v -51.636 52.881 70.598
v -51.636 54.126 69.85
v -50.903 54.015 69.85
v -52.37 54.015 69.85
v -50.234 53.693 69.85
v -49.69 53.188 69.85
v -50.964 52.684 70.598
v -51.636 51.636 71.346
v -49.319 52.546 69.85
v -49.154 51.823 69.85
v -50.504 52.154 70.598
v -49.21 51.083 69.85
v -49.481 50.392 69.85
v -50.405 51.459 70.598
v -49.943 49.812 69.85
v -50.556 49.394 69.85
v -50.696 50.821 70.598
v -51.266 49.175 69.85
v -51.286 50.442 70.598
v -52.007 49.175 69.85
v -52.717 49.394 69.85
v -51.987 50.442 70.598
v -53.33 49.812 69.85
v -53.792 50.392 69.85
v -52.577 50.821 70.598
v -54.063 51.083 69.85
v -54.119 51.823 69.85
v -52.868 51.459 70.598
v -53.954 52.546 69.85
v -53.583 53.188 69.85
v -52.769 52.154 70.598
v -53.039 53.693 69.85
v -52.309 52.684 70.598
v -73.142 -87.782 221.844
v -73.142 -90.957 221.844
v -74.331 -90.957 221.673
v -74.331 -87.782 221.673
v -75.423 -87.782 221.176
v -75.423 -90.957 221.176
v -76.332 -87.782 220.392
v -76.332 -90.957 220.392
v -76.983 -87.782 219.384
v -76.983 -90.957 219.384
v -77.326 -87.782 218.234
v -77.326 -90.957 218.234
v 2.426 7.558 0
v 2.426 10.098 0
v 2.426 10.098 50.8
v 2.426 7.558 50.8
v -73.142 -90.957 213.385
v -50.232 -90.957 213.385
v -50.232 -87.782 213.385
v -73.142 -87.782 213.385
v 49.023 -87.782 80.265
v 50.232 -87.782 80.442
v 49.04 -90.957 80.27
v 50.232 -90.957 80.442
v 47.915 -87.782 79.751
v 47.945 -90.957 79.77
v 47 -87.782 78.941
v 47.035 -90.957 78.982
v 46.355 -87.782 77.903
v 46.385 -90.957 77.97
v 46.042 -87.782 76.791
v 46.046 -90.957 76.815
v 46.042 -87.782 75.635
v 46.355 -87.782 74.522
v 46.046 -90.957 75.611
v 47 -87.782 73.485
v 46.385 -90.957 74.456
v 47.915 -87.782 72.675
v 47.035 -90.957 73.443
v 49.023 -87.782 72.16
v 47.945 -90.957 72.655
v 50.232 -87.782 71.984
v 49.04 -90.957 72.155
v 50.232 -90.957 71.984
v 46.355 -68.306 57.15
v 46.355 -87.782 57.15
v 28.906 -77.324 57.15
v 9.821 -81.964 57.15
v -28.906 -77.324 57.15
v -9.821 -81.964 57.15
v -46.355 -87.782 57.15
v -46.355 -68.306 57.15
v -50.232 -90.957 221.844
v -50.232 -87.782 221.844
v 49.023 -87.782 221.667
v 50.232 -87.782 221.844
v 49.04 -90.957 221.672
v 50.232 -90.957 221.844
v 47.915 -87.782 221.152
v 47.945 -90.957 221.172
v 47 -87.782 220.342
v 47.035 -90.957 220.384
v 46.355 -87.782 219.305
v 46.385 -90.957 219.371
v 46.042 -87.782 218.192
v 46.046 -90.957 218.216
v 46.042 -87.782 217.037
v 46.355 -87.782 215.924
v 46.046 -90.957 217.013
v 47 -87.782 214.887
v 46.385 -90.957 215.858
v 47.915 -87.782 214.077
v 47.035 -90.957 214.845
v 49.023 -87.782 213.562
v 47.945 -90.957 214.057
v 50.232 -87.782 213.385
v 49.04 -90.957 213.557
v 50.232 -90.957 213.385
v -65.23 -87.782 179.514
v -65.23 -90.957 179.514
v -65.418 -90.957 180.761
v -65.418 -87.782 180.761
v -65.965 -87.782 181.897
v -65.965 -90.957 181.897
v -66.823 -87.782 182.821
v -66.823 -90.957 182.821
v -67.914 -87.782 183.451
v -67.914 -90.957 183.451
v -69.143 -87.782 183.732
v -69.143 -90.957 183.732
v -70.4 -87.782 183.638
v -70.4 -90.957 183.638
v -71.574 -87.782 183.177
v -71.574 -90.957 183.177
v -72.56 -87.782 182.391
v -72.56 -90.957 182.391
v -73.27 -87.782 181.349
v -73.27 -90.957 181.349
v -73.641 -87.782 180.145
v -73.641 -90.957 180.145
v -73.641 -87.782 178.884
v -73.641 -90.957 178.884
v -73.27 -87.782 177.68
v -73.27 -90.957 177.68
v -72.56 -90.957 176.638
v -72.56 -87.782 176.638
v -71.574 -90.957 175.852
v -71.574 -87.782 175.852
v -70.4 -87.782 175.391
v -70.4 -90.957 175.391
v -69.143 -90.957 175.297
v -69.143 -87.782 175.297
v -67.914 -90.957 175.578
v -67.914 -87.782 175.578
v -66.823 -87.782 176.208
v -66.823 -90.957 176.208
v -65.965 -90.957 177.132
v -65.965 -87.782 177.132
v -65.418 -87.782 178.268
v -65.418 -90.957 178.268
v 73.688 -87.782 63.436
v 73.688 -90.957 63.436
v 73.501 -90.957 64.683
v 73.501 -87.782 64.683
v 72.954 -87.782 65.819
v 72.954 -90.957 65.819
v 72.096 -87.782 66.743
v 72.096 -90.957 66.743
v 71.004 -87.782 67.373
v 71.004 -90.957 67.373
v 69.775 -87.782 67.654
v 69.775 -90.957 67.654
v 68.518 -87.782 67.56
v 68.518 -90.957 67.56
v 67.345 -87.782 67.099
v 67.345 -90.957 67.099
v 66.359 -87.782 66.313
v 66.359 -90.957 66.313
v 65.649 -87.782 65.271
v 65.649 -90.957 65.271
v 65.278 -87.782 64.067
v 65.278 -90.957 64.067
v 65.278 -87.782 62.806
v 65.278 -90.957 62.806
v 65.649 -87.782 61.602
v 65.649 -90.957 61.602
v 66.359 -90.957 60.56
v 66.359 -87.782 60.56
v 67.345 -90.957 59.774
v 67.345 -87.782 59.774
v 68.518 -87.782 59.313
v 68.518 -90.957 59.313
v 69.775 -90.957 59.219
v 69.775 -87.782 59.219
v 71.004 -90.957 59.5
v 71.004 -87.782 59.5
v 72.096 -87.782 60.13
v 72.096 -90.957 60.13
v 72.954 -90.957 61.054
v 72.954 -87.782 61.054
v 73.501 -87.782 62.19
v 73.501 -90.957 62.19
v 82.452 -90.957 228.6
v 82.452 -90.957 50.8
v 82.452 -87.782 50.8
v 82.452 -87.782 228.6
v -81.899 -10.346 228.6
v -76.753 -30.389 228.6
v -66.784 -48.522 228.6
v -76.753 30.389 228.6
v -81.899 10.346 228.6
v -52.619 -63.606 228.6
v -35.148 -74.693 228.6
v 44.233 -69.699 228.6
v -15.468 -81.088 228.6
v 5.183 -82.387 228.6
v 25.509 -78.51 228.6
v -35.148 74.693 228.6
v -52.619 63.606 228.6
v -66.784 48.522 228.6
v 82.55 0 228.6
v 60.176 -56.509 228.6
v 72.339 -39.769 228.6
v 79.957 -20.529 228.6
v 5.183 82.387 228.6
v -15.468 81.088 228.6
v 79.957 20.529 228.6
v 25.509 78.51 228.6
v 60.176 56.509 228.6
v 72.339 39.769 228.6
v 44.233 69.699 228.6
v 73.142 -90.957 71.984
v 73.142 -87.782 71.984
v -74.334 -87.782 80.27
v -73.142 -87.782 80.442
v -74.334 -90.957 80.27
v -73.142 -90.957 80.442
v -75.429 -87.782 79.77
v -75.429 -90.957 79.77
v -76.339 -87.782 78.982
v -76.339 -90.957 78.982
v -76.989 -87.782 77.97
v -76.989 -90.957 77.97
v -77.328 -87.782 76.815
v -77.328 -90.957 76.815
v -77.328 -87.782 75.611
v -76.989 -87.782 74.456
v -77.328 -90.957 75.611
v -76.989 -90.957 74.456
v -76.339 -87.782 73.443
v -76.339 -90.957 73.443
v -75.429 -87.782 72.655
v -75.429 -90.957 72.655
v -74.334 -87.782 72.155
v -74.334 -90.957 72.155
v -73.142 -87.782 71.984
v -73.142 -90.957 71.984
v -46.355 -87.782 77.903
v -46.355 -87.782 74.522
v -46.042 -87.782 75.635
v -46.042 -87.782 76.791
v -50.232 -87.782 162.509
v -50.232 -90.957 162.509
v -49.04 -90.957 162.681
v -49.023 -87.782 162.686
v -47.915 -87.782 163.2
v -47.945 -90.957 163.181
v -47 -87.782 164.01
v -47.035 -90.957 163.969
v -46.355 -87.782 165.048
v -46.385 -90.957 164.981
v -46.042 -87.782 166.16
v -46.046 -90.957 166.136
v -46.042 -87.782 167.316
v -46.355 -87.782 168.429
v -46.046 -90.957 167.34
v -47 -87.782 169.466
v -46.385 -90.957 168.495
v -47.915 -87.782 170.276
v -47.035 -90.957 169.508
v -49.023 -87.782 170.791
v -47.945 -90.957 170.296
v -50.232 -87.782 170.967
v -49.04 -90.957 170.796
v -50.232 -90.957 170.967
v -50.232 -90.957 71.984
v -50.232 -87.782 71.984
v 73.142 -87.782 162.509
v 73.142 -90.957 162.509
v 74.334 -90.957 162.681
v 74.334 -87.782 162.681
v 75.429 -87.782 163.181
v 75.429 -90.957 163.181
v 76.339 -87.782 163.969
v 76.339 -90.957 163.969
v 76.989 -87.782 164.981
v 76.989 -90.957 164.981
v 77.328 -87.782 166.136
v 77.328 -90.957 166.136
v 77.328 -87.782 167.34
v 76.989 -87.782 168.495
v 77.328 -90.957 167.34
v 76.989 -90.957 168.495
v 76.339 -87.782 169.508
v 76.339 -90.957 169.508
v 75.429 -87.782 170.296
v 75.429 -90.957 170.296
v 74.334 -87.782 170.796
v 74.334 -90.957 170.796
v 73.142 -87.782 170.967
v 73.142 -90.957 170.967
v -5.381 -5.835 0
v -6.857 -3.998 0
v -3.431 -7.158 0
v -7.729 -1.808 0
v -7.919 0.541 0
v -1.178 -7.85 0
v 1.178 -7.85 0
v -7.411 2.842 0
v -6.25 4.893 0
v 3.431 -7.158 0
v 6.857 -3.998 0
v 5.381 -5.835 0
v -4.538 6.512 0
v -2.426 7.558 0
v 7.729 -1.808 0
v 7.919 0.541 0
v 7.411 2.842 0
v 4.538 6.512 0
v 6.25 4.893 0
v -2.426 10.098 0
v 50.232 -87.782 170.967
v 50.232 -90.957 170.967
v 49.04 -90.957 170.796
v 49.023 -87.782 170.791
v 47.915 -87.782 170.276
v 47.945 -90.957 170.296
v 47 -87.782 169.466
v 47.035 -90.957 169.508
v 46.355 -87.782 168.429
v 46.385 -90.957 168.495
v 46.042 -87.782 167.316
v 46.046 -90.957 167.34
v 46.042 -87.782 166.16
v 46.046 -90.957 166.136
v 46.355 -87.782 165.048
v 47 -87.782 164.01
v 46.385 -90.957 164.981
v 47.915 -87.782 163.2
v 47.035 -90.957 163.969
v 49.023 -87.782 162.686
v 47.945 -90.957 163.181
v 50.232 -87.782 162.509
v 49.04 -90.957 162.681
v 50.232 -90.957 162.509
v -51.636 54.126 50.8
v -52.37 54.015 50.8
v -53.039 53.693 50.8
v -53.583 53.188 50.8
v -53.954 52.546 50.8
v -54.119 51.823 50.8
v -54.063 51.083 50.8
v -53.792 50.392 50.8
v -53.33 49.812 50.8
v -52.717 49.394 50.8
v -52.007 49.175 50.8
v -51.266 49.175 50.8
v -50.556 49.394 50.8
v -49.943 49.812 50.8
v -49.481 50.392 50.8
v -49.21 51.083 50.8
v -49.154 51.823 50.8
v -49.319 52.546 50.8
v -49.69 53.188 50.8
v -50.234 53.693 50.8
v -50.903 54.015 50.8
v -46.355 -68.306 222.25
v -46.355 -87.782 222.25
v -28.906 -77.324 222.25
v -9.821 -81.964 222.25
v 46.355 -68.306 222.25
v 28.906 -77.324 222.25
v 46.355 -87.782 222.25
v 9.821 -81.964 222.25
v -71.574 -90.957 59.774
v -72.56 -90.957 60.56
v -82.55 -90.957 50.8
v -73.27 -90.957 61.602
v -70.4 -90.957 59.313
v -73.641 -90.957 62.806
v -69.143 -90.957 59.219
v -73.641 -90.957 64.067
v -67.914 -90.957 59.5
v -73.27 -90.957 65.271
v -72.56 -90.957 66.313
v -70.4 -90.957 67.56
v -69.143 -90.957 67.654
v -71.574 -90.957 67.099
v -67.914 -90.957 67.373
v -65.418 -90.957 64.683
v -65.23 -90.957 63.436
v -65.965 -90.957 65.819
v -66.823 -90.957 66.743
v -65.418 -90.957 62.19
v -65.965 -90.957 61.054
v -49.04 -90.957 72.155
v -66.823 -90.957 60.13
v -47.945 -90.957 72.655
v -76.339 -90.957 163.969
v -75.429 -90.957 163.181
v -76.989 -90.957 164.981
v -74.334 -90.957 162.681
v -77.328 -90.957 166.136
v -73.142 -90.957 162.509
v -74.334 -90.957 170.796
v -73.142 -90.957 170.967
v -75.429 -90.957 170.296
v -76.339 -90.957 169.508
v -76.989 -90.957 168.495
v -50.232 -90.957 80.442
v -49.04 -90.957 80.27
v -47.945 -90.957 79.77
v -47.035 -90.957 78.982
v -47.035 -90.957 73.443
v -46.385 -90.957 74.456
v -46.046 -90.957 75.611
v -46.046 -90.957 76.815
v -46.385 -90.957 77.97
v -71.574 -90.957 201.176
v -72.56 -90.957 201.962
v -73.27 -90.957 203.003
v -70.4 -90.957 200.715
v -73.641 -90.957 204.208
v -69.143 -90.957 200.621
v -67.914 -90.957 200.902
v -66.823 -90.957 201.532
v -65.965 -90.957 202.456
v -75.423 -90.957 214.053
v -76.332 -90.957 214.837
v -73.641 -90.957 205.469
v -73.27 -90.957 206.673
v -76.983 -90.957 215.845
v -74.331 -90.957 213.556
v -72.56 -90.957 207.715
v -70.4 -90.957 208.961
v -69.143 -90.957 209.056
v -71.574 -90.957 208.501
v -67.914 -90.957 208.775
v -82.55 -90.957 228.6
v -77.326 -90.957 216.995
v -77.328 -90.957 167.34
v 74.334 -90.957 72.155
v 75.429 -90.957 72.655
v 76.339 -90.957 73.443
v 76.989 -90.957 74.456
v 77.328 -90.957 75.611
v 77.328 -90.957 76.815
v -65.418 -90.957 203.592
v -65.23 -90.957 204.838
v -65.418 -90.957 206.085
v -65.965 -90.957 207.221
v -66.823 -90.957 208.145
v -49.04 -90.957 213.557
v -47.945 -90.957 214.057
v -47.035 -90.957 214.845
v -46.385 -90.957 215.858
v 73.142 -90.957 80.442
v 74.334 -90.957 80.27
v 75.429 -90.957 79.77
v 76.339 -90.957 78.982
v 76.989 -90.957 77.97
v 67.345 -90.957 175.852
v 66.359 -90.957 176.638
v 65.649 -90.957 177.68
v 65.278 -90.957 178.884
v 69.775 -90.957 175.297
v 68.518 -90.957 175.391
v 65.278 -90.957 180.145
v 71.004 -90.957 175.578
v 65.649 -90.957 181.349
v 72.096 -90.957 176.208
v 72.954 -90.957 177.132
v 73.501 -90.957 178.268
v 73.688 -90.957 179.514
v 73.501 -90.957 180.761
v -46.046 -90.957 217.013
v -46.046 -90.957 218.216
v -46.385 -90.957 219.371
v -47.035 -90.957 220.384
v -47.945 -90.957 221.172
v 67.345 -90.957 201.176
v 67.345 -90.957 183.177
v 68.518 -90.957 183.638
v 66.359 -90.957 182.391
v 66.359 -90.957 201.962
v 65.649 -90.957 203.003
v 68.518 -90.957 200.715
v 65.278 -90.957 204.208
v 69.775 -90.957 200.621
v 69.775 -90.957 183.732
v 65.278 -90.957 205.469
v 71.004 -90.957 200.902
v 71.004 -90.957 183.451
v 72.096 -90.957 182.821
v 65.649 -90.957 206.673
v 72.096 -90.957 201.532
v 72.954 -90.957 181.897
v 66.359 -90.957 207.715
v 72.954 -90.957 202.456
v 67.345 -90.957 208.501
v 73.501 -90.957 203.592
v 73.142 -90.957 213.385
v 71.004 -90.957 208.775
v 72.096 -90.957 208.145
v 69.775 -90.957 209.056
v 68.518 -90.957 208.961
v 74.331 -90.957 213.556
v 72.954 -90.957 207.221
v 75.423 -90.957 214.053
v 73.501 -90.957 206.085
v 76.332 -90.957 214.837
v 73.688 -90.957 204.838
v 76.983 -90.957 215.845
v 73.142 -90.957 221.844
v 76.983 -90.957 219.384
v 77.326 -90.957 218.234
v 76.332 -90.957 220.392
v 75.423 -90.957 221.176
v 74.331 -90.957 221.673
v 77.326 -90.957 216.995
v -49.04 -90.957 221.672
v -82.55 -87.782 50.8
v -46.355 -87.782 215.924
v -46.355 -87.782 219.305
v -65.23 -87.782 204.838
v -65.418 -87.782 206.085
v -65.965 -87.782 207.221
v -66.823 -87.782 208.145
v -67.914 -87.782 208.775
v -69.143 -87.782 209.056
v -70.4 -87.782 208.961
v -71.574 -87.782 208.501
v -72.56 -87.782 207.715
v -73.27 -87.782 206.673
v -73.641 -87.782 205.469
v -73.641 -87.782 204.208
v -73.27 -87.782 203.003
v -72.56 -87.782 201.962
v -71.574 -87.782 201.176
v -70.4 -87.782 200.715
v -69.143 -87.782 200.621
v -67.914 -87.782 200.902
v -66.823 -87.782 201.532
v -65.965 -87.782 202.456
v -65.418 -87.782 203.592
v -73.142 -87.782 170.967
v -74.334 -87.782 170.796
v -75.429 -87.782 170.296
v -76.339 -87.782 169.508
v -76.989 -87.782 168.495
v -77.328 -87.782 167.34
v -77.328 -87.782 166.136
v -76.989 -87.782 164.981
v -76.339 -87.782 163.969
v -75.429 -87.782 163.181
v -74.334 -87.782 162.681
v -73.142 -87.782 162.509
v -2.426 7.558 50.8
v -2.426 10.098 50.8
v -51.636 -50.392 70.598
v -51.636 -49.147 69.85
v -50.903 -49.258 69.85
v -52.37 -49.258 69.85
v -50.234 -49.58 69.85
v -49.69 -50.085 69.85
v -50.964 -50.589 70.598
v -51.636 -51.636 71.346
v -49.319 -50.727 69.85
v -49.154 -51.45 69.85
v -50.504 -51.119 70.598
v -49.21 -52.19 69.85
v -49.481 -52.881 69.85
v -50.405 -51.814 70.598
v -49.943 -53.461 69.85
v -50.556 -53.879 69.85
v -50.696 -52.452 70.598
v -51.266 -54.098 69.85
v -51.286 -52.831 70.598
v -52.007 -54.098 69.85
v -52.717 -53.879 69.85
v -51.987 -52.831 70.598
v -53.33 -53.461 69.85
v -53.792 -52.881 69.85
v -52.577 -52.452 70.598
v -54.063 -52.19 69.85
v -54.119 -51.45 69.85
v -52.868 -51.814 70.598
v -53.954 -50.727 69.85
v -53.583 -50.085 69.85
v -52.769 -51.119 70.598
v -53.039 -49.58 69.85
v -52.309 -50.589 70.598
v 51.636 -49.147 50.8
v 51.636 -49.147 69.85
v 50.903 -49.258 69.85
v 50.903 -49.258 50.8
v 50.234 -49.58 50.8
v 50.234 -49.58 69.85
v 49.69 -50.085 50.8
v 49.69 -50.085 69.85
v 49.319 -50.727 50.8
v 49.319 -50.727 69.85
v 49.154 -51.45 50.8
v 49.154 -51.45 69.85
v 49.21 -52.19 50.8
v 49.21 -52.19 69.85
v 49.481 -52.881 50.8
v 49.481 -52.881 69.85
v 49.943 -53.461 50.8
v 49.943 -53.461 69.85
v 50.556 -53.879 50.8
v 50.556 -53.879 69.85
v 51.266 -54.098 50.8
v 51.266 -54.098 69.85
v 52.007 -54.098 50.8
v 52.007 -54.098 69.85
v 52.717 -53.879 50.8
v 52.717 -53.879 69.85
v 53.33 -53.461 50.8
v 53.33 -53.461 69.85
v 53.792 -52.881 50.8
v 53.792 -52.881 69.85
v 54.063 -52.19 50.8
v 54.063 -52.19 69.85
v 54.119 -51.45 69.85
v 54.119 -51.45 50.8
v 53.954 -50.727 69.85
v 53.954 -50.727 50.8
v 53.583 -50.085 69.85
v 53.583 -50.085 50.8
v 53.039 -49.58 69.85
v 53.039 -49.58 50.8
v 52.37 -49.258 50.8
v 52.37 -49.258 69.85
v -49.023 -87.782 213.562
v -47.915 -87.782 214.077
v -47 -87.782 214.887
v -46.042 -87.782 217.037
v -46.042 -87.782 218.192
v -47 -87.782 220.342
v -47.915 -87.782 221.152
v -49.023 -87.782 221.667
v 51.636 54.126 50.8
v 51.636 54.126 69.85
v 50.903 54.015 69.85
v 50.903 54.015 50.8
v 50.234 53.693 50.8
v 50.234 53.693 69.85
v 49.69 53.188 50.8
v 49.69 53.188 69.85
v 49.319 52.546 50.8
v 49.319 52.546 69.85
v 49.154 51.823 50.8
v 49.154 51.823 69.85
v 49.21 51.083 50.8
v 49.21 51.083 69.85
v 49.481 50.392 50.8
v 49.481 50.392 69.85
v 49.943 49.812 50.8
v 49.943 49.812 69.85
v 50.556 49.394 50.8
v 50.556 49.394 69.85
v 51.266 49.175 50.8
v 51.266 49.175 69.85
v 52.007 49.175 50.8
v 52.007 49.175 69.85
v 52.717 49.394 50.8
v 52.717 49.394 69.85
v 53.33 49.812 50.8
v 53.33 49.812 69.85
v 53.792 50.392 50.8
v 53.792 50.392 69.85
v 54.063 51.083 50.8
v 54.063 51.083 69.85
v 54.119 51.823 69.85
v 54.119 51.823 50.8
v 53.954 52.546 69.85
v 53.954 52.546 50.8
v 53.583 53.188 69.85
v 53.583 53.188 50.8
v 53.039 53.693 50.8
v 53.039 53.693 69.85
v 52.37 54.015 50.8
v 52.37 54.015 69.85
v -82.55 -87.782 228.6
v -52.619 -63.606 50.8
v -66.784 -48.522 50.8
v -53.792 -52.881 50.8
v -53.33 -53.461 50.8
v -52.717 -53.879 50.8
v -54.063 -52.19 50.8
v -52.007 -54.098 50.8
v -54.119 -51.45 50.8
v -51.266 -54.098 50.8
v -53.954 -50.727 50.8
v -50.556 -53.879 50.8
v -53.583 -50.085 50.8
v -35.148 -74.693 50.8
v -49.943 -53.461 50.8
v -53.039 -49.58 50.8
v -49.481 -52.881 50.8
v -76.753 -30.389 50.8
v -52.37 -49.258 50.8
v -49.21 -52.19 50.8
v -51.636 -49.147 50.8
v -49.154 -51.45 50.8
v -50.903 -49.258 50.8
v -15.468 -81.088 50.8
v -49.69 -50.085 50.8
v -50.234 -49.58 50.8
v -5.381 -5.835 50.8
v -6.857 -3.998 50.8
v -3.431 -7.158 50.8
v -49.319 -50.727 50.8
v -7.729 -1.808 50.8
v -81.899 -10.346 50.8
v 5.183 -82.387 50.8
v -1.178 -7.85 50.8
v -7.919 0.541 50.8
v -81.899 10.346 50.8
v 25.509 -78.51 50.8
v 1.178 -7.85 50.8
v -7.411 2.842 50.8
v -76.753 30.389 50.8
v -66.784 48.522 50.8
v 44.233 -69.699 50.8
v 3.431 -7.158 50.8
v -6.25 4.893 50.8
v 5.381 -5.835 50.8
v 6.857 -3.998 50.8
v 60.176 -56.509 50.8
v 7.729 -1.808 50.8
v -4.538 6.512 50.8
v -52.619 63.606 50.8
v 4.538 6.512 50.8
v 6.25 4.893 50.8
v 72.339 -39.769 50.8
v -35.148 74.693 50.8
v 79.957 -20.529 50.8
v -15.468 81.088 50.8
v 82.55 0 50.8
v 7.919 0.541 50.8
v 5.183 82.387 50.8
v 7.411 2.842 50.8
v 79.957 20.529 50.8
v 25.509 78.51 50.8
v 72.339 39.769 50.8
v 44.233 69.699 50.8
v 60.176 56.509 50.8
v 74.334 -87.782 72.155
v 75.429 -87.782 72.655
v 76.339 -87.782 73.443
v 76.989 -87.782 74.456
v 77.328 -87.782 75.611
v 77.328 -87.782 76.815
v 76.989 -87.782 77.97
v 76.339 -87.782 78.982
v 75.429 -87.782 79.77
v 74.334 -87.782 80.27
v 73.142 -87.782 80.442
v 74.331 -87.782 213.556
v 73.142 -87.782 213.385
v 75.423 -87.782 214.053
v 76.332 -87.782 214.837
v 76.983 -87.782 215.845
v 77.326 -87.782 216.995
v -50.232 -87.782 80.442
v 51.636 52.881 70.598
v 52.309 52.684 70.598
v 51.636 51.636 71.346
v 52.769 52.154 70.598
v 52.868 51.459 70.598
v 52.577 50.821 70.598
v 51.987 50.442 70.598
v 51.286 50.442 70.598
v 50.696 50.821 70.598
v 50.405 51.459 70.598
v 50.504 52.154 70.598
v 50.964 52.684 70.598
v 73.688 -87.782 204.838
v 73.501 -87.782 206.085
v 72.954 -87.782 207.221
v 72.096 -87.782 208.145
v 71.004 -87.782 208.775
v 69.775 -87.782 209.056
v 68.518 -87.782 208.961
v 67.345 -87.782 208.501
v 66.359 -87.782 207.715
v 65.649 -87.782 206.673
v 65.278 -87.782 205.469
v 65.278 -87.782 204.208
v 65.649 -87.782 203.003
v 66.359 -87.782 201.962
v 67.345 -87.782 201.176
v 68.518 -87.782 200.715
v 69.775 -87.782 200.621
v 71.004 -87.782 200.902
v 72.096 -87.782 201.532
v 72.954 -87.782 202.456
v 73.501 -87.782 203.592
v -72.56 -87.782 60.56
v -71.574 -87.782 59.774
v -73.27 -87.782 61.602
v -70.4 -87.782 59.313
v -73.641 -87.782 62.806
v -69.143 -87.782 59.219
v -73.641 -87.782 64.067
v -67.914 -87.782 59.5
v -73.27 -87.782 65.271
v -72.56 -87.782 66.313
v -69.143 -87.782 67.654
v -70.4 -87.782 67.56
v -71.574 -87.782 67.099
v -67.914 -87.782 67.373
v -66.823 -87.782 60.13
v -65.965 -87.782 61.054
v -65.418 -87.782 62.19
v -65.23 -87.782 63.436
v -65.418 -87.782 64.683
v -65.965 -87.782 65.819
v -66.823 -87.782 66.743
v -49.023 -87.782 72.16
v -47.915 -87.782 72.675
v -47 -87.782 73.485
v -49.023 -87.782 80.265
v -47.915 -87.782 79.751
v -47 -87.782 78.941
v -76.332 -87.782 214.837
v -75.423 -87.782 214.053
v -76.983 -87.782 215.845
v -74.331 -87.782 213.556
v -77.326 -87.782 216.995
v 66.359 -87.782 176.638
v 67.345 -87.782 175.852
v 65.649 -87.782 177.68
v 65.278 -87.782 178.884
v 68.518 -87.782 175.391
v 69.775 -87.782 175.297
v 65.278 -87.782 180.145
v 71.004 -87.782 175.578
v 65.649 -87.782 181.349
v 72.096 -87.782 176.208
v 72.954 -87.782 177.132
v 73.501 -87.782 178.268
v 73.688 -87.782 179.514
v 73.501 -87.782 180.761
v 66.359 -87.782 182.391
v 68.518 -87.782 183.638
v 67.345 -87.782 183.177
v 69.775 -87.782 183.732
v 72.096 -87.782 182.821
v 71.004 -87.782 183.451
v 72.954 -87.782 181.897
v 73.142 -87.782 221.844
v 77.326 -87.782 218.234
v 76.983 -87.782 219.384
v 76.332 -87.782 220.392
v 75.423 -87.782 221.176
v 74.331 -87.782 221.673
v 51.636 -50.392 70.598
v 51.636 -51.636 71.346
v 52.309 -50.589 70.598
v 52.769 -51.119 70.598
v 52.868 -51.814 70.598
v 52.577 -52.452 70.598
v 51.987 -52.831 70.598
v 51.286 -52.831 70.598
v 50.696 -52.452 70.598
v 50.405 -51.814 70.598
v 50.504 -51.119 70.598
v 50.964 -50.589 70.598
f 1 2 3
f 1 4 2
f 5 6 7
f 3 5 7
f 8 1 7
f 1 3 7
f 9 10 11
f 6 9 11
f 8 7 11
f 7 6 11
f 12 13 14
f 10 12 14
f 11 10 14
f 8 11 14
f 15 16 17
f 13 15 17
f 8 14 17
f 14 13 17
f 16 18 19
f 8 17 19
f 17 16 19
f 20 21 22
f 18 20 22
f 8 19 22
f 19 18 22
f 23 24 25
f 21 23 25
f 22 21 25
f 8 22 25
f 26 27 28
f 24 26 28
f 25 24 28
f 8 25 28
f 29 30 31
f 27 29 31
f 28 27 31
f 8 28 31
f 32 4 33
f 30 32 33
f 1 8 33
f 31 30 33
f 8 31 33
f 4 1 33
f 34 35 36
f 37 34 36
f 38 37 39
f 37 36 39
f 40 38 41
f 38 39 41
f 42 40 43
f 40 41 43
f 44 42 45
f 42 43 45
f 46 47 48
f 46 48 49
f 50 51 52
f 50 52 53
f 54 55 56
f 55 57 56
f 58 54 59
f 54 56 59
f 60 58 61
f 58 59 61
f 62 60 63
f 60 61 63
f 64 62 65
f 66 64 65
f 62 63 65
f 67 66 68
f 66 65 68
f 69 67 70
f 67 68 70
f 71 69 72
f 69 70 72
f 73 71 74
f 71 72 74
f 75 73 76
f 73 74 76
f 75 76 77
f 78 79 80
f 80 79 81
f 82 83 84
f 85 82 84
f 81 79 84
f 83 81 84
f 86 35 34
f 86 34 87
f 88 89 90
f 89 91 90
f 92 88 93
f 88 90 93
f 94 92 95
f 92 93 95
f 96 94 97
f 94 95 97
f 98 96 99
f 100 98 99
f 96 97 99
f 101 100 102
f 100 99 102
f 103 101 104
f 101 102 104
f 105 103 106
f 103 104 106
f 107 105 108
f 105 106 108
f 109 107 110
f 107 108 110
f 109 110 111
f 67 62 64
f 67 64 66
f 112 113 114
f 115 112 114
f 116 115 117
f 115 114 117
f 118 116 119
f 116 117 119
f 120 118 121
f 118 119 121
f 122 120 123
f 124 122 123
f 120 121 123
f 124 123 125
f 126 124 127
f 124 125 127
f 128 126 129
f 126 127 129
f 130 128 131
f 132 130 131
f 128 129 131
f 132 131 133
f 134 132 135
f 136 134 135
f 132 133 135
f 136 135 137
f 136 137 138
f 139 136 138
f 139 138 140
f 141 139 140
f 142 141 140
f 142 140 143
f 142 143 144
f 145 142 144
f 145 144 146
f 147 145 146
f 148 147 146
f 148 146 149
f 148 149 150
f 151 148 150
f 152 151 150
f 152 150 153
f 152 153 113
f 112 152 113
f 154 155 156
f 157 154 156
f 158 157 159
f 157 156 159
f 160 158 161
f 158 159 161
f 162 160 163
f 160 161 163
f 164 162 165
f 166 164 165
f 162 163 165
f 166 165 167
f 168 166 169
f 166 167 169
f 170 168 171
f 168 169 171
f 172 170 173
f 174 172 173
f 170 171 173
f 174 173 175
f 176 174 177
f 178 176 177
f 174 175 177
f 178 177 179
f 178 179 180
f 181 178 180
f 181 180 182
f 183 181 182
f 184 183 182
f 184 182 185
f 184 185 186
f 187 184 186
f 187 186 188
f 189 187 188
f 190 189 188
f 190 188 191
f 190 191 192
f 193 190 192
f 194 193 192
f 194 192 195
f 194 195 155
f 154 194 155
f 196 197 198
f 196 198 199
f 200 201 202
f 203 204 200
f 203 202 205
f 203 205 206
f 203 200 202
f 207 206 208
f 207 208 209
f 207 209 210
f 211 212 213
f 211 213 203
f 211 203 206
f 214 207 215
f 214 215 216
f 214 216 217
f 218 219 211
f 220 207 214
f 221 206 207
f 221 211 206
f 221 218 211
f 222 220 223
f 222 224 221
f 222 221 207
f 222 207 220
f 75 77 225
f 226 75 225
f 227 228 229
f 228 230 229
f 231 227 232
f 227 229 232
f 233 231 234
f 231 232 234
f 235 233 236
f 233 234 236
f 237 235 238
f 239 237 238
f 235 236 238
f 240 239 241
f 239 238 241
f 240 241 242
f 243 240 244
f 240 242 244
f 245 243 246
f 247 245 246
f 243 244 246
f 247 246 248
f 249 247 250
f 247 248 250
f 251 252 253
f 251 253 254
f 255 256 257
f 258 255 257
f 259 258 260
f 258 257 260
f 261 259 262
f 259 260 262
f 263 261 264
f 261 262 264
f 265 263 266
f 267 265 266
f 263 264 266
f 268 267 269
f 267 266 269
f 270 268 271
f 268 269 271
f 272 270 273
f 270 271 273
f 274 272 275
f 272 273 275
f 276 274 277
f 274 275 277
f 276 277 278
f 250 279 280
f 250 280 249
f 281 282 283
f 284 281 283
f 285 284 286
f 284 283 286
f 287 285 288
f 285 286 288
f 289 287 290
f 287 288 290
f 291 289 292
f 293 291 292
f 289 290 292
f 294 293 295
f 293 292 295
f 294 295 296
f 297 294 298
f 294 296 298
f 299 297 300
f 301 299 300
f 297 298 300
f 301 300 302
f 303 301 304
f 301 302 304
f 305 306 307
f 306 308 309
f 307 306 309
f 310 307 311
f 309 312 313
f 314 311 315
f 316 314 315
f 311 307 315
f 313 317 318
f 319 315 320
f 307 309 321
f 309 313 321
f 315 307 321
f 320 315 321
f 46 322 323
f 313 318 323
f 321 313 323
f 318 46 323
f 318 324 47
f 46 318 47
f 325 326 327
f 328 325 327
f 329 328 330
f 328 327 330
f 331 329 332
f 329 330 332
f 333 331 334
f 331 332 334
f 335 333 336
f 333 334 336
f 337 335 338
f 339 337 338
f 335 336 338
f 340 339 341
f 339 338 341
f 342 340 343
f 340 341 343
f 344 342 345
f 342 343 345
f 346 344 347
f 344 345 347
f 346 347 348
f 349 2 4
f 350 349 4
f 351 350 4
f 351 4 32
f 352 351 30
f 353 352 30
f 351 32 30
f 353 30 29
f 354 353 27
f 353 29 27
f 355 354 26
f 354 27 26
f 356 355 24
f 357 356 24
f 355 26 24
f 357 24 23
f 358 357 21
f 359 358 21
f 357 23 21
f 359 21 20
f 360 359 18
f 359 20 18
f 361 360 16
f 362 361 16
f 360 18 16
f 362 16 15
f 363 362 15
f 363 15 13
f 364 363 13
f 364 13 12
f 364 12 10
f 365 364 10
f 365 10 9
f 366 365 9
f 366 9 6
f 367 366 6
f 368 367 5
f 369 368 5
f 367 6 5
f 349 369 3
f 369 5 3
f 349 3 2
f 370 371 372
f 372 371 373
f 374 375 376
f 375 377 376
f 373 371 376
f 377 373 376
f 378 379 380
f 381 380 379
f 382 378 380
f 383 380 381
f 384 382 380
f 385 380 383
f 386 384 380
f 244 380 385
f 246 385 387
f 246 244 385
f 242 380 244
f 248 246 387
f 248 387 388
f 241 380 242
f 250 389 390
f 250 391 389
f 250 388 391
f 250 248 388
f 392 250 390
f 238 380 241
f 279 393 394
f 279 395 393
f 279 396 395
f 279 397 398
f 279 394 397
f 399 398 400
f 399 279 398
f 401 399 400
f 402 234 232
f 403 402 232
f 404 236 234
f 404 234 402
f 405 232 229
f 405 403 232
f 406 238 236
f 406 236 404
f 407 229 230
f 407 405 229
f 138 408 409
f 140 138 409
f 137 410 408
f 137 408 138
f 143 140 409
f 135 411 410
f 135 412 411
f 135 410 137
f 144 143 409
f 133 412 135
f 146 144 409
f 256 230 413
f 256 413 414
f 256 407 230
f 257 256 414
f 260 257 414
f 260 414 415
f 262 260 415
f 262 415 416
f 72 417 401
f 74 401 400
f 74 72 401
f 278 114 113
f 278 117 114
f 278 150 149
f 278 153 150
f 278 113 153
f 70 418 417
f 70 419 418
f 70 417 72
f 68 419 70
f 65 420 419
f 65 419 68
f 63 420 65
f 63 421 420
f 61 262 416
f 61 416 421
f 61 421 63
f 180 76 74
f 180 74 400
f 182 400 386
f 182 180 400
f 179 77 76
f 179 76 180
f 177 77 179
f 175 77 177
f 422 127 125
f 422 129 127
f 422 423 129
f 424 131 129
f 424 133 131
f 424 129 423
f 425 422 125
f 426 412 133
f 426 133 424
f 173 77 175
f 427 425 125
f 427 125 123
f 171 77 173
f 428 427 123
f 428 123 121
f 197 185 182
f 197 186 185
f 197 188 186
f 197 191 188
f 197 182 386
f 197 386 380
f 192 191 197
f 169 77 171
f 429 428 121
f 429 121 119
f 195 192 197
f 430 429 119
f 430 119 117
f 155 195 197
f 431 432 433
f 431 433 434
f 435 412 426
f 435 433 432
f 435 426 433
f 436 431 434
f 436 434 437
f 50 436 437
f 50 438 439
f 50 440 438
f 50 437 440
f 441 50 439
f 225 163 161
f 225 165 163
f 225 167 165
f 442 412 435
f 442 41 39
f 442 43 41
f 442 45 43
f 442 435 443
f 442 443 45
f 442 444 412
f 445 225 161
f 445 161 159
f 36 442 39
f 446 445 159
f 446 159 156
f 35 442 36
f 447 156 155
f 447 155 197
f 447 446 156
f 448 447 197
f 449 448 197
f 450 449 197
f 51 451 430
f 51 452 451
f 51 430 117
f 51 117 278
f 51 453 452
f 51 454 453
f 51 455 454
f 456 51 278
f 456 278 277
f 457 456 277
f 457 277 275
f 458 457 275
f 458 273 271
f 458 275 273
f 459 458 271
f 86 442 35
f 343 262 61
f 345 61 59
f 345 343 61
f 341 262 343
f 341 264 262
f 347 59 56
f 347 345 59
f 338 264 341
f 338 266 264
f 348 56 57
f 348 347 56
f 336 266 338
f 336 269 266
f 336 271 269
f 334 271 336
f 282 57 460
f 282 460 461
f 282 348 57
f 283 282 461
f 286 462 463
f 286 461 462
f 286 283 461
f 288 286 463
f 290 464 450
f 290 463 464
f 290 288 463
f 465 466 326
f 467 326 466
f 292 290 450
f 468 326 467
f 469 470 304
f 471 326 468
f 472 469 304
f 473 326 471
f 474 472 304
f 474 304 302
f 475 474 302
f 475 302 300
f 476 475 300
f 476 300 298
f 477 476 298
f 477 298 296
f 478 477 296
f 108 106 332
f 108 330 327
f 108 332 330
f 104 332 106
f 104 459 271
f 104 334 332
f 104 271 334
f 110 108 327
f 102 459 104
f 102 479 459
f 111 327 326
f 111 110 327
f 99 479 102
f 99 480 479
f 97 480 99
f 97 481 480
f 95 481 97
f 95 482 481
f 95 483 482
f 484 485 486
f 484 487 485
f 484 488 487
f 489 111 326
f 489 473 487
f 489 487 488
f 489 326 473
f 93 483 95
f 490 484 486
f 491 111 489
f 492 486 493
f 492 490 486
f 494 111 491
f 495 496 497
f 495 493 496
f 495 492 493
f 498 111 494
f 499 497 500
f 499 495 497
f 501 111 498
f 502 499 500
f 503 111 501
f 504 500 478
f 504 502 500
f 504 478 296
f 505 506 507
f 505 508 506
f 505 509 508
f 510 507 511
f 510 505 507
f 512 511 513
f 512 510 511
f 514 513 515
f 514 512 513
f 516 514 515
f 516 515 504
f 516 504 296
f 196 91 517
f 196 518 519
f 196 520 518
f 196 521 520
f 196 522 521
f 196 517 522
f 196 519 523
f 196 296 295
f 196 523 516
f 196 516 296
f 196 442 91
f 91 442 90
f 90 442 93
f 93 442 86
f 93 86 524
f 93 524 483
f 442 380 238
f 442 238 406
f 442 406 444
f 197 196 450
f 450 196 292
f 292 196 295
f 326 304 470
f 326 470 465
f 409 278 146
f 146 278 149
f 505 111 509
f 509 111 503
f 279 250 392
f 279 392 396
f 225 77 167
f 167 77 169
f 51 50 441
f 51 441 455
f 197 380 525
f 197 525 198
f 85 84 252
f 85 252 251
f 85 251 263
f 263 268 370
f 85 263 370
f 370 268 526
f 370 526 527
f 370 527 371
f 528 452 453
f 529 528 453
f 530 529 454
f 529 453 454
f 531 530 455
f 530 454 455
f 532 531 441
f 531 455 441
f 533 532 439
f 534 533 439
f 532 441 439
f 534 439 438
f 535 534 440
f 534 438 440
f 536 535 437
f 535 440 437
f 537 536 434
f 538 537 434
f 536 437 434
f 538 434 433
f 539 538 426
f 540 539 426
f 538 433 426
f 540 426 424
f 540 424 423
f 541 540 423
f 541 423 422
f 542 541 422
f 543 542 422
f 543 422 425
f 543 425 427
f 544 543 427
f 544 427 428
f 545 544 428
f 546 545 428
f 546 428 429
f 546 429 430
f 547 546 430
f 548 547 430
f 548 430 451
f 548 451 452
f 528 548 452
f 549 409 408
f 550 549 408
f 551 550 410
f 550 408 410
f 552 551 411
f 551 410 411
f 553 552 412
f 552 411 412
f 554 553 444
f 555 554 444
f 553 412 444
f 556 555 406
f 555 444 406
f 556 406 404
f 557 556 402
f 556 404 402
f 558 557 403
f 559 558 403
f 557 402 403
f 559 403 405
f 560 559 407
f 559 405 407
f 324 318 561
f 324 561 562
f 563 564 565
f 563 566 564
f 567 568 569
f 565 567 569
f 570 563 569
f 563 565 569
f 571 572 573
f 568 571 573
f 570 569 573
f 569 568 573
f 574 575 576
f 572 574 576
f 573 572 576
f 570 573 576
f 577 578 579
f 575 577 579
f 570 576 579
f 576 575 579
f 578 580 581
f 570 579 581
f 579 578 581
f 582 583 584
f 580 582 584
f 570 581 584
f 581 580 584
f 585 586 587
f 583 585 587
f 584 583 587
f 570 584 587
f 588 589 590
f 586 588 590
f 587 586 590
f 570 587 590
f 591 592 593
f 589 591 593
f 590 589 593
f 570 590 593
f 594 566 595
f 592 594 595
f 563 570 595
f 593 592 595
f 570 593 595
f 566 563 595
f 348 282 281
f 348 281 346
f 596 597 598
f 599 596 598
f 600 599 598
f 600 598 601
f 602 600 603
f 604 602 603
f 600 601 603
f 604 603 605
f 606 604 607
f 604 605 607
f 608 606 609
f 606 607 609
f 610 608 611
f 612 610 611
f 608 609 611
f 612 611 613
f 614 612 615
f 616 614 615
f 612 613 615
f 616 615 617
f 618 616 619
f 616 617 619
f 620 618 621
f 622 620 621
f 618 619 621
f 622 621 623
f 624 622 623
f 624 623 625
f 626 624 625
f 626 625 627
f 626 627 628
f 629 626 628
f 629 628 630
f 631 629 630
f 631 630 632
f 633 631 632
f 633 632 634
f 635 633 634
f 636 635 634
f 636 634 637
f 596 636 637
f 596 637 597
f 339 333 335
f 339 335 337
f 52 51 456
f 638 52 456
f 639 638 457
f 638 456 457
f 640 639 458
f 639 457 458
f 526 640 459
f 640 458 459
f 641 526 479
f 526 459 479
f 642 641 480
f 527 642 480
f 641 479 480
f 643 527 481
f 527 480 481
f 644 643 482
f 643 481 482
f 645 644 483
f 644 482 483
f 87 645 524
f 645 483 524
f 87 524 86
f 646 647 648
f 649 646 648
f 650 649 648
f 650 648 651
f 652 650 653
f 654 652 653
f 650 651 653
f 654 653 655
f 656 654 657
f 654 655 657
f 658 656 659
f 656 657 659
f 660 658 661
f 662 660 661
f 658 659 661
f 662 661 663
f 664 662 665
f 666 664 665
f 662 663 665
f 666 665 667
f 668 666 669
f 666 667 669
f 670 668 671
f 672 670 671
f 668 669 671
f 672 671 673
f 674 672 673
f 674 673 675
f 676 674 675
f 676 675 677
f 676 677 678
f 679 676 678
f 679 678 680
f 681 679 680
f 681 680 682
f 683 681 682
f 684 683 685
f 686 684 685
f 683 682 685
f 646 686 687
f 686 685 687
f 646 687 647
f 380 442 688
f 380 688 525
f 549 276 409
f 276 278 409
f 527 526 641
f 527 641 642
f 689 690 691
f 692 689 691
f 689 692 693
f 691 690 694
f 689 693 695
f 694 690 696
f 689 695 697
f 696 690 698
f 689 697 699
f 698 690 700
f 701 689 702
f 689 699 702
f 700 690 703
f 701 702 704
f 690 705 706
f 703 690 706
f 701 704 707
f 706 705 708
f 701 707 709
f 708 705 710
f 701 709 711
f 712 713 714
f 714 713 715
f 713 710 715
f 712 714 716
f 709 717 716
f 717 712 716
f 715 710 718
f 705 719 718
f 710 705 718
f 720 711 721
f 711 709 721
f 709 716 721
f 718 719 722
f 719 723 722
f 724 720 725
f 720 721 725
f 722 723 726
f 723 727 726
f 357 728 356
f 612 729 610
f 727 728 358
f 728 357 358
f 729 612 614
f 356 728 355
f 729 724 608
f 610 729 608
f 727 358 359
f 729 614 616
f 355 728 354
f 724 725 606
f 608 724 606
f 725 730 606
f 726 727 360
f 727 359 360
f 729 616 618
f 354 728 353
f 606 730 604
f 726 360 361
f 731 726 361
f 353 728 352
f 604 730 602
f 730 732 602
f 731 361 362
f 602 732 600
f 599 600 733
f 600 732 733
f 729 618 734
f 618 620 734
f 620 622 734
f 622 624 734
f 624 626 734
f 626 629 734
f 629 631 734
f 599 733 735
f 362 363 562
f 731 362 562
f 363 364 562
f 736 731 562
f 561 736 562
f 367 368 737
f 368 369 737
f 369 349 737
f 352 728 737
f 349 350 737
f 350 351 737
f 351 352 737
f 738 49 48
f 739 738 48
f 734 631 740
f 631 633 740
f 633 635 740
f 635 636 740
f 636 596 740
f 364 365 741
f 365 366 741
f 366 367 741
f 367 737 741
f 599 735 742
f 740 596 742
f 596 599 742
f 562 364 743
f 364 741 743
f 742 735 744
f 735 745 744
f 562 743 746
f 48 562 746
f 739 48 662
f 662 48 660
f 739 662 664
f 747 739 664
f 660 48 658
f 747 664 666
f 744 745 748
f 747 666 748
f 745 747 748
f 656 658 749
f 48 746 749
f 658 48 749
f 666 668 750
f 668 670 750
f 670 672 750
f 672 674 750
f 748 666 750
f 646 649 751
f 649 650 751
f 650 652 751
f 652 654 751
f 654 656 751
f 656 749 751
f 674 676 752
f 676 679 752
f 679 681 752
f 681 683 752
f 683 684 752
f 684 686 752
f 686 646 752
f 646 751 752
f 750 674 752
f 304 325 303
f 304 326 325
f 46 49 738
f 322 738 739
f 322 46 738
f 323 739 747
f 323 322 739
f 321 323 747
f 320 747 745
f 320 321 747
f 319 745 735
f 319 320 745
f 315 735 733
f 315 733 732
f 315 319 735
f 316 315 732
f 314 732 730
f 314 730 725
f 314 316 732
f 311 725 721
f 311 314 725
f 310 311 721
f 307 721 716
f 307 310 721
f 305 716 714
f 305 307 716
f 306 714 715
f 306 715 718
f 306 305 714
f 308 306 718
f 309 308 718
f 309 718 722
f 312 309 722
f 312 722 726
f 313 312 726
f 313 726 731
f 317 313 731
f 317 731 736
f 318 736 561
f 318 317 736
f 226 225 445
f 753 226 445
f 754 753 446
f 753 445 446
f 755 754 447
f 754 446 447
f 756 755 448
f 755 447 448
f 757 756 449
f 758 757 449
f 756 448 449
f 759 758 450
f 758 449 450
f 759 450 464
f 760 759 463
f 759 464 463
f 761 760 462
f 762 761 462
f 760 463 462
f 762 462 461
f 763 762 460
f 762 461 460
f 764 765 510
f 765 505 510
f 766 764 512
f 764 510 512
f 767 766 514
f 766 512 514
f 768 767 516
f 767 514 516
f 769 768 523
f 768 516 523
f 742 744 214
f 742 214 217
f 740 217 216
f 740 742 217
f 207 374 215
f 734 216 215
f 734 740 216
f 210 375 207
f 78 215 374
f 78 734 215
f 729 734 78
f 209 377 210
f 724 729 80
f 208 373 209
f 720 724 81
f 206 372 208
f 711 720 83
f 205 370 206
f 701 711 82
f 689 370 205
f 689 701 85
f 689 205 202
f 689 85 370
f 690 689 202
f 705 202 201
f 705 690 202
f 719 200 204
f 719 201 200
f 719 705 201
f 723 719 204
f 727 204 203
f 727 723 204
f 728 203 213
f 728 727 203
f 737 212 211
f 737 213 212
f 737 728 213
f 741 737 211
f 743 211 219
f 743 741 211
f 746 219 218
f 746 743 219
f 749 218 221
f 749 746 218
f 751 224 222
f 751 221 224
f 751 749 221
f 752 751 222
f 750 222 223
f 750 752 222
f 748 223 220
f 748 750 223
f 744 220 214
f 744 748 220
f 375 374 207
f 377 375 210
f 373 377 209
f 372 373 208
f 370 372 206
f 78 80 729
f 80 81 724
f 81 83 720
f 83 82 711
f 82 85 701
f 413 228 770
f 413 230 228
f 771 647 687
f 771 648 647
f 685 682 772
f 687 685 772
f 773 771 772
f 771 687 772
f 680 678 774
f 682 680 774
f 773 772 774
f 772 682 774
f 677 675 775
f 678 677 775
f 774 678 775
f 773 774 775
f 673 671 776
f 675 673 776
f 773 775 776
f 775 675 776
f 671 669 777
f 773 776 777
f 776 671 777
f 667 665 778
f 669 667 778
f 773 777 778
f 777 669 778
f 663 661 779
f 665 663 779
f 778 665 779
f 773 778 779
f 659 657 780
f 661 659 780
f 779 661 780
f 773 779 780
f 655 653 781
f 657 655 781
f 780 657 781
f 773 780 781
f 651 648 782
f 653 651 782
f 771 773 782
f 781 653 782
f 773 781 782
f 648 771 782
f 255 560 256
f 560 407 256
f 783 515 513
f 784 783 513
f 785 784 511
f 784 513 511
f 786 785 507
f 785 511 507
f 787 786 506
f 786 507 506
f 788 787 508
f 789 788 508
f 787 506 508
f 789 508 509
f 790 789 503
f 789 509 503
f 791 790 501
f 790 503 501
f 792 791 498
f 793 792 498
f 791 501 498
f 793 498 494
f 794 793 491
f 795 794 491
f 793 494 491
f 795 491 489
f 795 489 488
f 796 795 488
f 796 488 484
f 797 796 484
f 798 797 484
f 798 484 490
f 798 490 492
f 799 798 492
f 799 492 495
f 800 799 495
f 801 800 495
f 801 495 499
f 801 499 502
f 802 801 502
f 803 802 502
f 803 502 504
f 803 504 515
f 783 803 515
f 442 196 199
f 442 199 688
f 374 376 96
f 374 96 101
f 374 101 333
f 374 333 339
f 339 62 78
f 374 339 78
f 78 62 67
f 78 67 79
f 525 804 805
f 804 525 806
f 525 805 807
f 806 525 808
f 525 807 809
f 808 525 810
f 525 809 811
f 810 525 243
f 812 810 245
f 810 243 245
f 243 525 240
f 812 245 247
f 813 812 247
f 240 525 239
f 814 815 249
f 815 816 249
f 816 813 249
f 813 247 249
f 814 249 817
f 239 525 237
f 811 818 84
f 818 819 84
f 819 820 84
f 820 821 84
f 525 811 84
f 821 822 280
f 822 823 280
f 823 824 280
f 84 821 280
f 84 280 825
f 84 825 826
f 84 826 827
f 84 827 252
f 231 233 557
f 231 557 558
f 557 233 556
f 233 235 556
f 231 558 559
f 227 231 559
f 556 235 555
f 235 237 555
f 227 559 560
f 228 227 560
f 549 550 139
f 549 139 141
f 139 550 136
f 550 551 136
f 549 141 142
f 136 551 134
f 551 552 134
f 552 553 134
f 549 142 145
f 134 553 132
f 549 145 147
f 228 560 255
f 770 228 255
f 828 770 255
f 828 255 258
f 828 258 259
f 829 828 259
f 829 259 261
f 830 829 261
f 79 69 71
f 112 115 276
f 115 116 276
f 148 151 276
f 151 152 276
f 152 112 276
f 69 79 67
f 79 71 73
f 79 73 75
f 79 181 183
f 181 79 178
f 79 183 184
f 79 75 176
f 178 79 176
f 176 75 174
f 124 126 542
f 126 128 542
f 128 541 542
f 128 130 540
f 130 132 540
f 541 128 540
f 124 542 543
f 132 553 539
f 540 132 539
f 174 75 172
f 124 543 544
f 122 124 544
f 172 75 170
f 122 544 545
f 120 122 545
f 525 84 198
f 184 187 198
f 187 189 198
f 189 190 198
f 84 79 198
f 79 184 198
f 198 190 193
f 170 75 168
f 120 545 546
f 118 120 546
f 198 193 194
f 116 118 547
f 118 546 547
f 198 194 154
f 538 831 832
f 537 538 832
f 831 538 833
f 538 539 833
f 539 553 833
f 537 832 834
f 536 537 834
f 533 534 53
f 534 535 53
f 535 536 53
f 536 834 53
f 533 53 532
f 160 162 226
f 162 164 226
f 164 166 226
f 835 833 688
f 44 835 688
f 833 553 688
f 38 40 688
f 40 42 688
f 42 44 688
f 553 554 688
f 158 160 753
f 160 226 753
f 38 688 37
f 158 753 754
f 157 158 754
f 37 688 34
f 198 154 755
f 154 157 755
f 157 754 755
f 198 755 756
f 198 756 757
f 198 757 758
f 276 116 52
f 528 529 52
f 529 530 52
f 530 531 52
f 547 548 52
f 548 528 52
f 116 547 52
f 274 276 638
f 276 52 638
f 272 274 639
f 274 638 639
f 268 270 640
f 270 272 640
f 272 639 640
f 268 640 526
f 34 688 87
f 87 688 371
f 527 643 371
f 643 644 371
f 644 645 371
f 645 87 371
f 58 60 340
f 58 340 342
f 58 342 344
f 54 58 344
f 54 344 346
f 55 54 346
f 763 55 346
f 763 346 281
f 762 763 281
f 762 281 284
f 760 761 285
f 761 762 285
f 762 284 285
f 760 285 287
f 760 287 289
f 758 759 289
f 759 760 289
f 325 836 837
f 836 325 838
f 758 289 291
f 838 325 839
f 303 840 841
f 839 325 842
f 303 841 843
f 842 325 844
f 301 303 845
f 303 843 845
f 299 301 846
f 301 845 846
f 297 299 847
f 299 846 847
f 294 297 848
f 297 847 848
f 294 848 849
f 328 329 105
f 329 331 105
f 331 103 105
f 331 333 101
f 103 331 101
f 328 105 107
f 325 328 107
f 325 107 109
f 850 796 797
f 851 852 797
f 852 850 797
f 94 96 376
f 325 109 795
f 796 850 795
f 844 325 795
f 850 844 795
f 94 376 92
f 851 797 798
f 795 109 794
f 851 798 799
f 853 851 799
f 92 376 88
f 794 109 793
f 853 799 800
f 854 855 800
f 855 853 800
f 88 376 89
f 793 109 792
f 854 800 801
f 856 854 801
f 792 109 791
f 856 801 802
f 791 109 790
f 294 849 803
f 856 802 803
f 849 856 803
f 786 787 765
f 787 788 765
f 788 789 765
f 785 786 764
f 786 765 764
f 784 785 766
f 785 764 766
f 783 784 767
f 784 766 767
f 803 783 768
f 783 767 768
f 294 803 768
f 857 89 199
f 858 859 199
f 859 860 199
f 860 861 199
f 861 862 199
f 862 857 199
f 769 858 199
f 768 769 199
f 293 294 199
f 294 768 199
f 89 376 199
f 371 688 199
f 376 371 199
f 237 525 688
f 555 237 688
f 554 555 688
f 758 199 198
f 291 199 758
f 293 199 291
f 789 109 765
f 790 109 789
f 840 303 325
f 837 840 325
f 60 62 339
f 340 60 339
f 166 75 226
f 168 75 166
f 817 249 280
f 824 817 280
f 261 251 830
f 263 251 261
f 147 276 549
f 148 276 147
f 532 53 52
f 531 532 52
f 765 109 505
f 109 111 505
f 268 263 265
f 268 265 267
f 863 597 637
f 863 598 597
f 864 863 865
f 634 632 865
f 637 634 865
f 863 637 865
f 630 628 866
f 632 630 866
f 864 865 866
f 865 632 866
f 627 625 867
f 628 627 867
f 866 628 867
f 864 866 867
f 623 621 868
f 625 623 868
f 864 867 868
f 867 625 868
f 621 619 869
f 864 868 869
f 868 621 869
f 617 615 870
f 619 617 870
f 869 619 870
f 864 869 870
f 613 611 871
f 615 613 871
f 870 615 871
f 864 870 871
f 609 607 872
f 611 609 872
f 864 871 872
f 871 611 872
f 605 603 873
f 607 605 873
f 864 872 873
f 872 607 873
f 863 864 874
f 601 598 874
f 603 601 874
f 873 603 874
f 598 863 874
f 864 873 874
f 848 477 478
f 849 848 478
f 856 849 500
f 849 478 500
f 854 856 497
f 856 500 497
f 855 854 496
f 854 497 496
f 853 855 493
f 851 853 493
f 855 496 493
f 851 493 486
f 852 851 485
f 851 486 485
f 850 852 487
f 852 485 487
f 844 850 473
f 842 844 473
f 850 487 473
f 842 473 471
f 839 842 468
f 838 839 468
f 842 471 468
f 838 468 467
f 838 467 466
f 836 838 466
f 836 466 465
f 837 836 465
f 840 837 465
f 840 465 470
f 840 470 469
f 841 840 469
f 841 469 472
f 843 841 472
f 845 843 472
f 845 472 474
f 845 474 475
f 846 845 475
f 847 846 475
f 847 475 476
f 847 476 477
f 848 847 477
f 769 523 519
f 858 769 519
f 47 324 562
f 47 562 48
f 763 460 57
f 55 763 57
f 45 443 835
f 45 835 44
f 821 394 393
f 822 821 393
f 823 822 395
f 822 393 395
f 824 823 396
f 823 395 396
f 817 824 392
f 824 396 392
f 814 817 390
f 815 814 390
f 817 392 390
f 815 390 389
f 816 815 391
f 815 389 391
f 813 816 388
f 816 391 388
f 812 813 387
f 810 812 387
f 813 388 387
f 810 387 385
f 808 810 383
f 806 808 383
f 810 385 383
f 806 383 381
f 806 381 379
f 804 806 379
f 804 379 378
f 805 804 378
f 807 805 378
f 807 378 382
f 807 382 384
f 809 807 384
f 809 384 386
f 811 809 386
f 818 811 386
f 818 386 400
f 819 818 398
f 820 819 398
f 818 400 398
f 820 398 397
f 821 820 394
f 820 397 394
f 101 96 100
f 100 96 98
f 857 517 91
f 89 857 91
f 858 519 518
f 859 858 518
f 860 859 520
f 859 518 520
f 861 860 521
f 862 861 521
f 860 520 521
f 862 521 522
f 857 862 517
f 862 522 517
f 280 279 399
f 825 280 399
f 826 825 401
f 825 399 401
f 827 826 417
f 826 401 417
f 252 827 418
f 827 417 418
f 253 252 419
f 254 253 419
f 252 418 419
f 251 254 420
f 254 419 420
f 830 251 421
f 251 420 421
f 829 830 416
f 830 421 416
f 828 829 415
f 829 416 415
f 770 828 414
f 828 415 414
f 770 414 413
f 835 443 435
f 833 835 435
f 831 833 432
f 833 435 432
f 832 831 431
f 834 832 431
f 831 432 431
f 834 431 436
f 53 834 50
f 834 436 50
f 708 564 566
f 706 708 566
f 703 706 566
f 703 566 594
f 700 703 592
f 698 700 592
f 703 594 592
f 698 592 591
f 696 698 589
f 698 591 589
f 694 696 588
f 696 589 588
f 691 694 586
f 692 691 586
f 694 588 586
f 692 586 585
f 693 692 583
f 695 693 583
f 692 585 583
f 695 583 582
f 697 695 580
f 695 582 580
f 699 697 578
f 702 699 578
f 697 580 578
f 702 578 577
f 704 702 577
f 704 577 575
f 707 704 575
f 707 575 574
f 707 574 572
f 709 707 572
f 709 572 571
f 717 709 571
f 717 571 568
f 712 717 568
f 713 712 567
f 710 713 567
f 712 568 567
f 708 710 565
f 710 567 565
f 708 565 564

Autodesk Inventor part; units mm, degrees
ref_plane "YZ Plane" through (0, 0, 0) normal (1, 0, 0) x (0, 1, 0)
ref_plane "XZ Plane" through (0, 0, 0) normal (0, 1, 0) x (-1, 0, 0)
ref_plane "XY Plane" through (0, 0, 0) normal (0, 0, 1) x (1, 0, 0)
sketch "Sketch1" plane through (0, 0, 0) normal (0, 0, 1) x (1, 0, 0)
  circle A0 centre (0, 0) radius 7.9375
  line L0 (-2.4257, 7.5578) -> (-2.4257, 10.0978)
  line L1 (-2.4257, 10.0978) -> (2.4257, 10.0978)
  line L2 (2.4257, 10.0978) -> (2.4257, 7.5578)
  point P0 (0, 10.0978)
  dimension "d0" = 15.875
  dimension "d1" = 2.54
  dimension "d2" = 4.8514
extrude "Extrusion1" add sketch "Sketch1" along normal blind 50.8
sketch "Sketch2" plane through (0, 0, 50.8) normal (0, 0, 1) x (1, 0, 0)
  circle A0 centre (0, 0) radius 82.55
  dimension "d5" = 165.1
extrude "Extrusion2" add sketch "Sketch2" along normal blind 177.8
sketch "Sketch3" plane through (0, 0, 50.8) normal (0, 0, -1) x (-1, 0, 0)
  circle A0 centre (0, 0) radius 73.025
  arc A1 (-2.4257, 7.5578) -> (2.4257, 7.5578) centre (0, 0) ccw projected
  line L0 (0, 0) -> (51.6365, 51.6365)
  line L1 (0, 0) -> (73.025, 0) construction
  line L2 (0, 0) -> (51.6365, -51.6365)
  line L3 (0, 0) -> (73.025, 0) construction
  line L4 (0, 0) -> (-51.6365, 51.6365)
  line L5 (0, 0) -> (73.025, 0) construction
  line L6 (0, 0) -> (-51.6365, -51.6365)
  line L7 (0, 0) -> (73.025, 0) construction
  dimension "d8" = 146.05
  dimension "d9" = 45
  dimension "d10" = 45
  dimension "d11" = 135
  dimension "d12" = 135
hole "Hole1" at (51.6365, 51.6365, 50.8) at (-51.6365, 51.6365, 50.8) at (-51.6365, -51.6365, 50.8) at (51.6365, -51.6365, 50.8) direction (0, 0, 1) diameter 4.9784 depth 19.05 tip angle 118 thread size "1/4-20 UNC" class "2B" standard "ANSI Unified Screw Threads"
ref_plane "Work Plane2" through (0, -82.55, 50.8) normal (0, 1, 0) x (-1, 0, 0)
sketch "Sketch4" plane through (0, -82.55, 50.8) normal (0, 1, 0) x (-1, 0, 0)
  line L0 (82.55, 177.8) -> (-82.55, 177.8) projected
  line L1 (-82.55, 0) -> (82.55, 0) projected
  line L2 (82.55, 0) -> (82.55, 177.8) projected
  line L3 (-82.55, 0) -> (-82.55, 177.8) projected
  line L4 (-46.355, 6.35) -> (46.355, 6.35)
  line L5 (46.355, 6.35) -> (46.355, 171.45)
  line L6 (46.355, 171.45) -> (-46.355, 171.45)
  line L7 (-46.355, 171.45) -> (-46.355, 6.35)
  point P0 (0, -50.8)
  point P1 (0, 6.35)
  dimension "d20" = 165.1
  dimension "d21" = 6.35
  dimension "d22" = 92.71
extrude "Extrusion3" add sketch "Sketch4" along normal blind 25.4 and the other way blind 5.2324 contours L7 L6 L5 L4
ref_plane "Work Plane7" through (0, -90.9574, 50.8) normal (0, -1, 0) x (1, 0, 0)
sketch "Sketch5" plane through (0, -90.9574, 50.8) normal (0, -1, 0) x (1, 0, 0)
  line L0 (82.55, 177.8) -> (-82.55, 177.8) projected
  line L1 (-82.55, 0) -> (82.55, 0) projected
  line L2 (82.4515, 177.8) -> (-82.55, 177.8)
  line L3 (-82.55, 177.8) -> (-82.55, 0)
  line L4 (-82.55, 0) -> (82.4515, 0)
  line L5 (82.4515, 0) -> (82.4515, 177.8)
  point P0 (0, -50.8)
extrude "Extrusion4" add sketch "Sketch5" against normal blind 3.175
ref_plane "Work Plane9" through (0, -94.1324, 50.8) normal (0, -1, 0) x (1, 0, 0)
sketch "Sketch6" plane through (0, -94.1324, 50.8) normal (0, -1, 0) x (1, 0, 0)
  circle A0 centre (69.4594, 154.0383) radius 4.2291
  line L0 (82.4515, 0) -> (82.4515, 177.8) projected
  line L1 (82.4515, 177.8) -> (-82.55, 177.8) projected
  line L2 (73.1424, 171.0436) -> (50.2316, 171.0436)
  line L3 (50.2316, 162.5854) -> (73.1424, 162.5854)
  line L4 (77.3259, 166.1953) -> (77.3259, 167.4337)
  arc A1 (73.1424, 162.5854) -> (73.1424, 171.0436) centre (73.1424, 166.8145) ccw
  arc A2 (50.2316, 171.0436) -> (50.2316, 162.5854) centre (50.2316, 166.8145) ccw
  line L5 (82.55, 177.8) -> (-82.55, 177.8) projected
  line L6 (-2.4257, -50.8) -> (-2.4257, 0) projected
  circle A3 centre (69.4594, 128.7145) radius 4.2291
  line L7 (73.1424, 111.7092) -> (50.2316, 111.7092)
  line L8 (50.2316, 120.1674) -> (73.1424, 120.1674)
  arc A4 (73.1424, 111.7092) -> (73.1424, 120.1674) centre (73.1424, 115.9383) ccw
  arc A5 (50.2316, 120.1674) -> (50.2316, 111.7092) centre (50.2316, 115.9383) ccw
  arc A6 (73.1424, 21.1836) -> (73.1424, 29.6418) centre (73.1424, 25.4127) ccw
  line L9 (50.2316, 21.1836) -> (73.1424, 21.1836)
  line L10 (73.1424, 29.6418) -> (50.2316, 29.6418)
  arc A7 (50.2316, 29.6418) -> (50.2316, 21.1836) centre (50.2316, 25.4127) ccw
  circle A8 centre (69.4594, 12.6365) radius 4.2291
  line L11 (-82.55, 0) -> (82.4515, 0) projected
  circle A9 centre (-69.4594, 154.0383) radius 4.2291
  line L12 (-73.1424, 171.0436) -> (-50.2316, 171.0436)
  line L13 (-50.2316, 162.5854) -> (-73.1424, 162.5854)
  line L14 (-77.3259, 166.1953) -> (-77.3259, 167.4337)
  arc A10 (-73.1424, 171.0436) -> (-73.1424, 162.5854) centre (-73.1424, 166.8145) ccw
  arc A11 (-50.2316, 162.5854) -> (-50.2316, 171.0436) centre (-50.2316, 166.8145) ccw
  arc A12 (-73.1424, 120.1674) -> (-73.1424, 111.7092) centre (-73.1424, 115.9383) ccw
  line L15 (-50.2316, 120.1674) -> (-73.1424, 120.1674)
  line L16 (-73.1424, 111.7092) -> (-50.2316, 111.7092)
  arc A13 (-50.2316, 111.7092) -> (-50.2316, 120.1674) centre (-50.2316, 115.9383) ccw
  circle A14 centre (-69.4594, 128.7145) radius 4.2291
  circle A15 centre (-69.4594, 12.6365) radius 4.2291
  line L17 (-50.2316, 21.1836) -> (-73.1424, 21.1836)
  line L18 (-73.1424, 29.6418) -> (-50.2316, 29.6418)
  arc A16 (-73.1424, 29.6418) -> (-73.1424, 21.1836) centre (-73.1424, 25.4127) ccw
  arc A17 (-50.2316, 21.1836) -> (-50.2316, 29.6418) centre (-50.2316, 25.4127) ccw
  point P0 (0, -50.8)
  dimension "d31" = 8.4582
  dimension "d32" = 12.9921
  dimension "d33" = 23.7617
  dimension "d38" = 8.4582
  dimension "d39" = 8.4582
  dimension "d40" = 22.9108
  dimension "d41" = 8.4582
  dimension "d46" = 6.7564
  dimension "d47" = 9.3091
  dimension "d50" = 12.6365
  dimension "d51" = 8.5471
extrude "Extrusion5" cut sketch "Sketch6" against normal blind 6.35 contours A0 | A1 L4 L3 A2 L2 | A3 | L7 A5 L8 A4 | L9 A7 L10 A6 | A8 | A9 | L12 A11 L13 A10 L14 | L15 A13 L16 A12 | A14 | A15 | L17 A16 L18 A17
sketch "Sketch7" plane through (0, -87.7824, 50.8) normal (0, -1, 0) x (1, 0, 0)
  point P0 (0, -50.8)
equation "\"d3\" = ShaftL"
equation "\"d5\" = MotoD"
equation "\"d6\" = MotoL"
equation "\"ShaftL\" = 50.8"
equation "\"MotoD\" = 165.1"
equation "\"MotoL\" = 177.8"
properties part number "Motor5"
